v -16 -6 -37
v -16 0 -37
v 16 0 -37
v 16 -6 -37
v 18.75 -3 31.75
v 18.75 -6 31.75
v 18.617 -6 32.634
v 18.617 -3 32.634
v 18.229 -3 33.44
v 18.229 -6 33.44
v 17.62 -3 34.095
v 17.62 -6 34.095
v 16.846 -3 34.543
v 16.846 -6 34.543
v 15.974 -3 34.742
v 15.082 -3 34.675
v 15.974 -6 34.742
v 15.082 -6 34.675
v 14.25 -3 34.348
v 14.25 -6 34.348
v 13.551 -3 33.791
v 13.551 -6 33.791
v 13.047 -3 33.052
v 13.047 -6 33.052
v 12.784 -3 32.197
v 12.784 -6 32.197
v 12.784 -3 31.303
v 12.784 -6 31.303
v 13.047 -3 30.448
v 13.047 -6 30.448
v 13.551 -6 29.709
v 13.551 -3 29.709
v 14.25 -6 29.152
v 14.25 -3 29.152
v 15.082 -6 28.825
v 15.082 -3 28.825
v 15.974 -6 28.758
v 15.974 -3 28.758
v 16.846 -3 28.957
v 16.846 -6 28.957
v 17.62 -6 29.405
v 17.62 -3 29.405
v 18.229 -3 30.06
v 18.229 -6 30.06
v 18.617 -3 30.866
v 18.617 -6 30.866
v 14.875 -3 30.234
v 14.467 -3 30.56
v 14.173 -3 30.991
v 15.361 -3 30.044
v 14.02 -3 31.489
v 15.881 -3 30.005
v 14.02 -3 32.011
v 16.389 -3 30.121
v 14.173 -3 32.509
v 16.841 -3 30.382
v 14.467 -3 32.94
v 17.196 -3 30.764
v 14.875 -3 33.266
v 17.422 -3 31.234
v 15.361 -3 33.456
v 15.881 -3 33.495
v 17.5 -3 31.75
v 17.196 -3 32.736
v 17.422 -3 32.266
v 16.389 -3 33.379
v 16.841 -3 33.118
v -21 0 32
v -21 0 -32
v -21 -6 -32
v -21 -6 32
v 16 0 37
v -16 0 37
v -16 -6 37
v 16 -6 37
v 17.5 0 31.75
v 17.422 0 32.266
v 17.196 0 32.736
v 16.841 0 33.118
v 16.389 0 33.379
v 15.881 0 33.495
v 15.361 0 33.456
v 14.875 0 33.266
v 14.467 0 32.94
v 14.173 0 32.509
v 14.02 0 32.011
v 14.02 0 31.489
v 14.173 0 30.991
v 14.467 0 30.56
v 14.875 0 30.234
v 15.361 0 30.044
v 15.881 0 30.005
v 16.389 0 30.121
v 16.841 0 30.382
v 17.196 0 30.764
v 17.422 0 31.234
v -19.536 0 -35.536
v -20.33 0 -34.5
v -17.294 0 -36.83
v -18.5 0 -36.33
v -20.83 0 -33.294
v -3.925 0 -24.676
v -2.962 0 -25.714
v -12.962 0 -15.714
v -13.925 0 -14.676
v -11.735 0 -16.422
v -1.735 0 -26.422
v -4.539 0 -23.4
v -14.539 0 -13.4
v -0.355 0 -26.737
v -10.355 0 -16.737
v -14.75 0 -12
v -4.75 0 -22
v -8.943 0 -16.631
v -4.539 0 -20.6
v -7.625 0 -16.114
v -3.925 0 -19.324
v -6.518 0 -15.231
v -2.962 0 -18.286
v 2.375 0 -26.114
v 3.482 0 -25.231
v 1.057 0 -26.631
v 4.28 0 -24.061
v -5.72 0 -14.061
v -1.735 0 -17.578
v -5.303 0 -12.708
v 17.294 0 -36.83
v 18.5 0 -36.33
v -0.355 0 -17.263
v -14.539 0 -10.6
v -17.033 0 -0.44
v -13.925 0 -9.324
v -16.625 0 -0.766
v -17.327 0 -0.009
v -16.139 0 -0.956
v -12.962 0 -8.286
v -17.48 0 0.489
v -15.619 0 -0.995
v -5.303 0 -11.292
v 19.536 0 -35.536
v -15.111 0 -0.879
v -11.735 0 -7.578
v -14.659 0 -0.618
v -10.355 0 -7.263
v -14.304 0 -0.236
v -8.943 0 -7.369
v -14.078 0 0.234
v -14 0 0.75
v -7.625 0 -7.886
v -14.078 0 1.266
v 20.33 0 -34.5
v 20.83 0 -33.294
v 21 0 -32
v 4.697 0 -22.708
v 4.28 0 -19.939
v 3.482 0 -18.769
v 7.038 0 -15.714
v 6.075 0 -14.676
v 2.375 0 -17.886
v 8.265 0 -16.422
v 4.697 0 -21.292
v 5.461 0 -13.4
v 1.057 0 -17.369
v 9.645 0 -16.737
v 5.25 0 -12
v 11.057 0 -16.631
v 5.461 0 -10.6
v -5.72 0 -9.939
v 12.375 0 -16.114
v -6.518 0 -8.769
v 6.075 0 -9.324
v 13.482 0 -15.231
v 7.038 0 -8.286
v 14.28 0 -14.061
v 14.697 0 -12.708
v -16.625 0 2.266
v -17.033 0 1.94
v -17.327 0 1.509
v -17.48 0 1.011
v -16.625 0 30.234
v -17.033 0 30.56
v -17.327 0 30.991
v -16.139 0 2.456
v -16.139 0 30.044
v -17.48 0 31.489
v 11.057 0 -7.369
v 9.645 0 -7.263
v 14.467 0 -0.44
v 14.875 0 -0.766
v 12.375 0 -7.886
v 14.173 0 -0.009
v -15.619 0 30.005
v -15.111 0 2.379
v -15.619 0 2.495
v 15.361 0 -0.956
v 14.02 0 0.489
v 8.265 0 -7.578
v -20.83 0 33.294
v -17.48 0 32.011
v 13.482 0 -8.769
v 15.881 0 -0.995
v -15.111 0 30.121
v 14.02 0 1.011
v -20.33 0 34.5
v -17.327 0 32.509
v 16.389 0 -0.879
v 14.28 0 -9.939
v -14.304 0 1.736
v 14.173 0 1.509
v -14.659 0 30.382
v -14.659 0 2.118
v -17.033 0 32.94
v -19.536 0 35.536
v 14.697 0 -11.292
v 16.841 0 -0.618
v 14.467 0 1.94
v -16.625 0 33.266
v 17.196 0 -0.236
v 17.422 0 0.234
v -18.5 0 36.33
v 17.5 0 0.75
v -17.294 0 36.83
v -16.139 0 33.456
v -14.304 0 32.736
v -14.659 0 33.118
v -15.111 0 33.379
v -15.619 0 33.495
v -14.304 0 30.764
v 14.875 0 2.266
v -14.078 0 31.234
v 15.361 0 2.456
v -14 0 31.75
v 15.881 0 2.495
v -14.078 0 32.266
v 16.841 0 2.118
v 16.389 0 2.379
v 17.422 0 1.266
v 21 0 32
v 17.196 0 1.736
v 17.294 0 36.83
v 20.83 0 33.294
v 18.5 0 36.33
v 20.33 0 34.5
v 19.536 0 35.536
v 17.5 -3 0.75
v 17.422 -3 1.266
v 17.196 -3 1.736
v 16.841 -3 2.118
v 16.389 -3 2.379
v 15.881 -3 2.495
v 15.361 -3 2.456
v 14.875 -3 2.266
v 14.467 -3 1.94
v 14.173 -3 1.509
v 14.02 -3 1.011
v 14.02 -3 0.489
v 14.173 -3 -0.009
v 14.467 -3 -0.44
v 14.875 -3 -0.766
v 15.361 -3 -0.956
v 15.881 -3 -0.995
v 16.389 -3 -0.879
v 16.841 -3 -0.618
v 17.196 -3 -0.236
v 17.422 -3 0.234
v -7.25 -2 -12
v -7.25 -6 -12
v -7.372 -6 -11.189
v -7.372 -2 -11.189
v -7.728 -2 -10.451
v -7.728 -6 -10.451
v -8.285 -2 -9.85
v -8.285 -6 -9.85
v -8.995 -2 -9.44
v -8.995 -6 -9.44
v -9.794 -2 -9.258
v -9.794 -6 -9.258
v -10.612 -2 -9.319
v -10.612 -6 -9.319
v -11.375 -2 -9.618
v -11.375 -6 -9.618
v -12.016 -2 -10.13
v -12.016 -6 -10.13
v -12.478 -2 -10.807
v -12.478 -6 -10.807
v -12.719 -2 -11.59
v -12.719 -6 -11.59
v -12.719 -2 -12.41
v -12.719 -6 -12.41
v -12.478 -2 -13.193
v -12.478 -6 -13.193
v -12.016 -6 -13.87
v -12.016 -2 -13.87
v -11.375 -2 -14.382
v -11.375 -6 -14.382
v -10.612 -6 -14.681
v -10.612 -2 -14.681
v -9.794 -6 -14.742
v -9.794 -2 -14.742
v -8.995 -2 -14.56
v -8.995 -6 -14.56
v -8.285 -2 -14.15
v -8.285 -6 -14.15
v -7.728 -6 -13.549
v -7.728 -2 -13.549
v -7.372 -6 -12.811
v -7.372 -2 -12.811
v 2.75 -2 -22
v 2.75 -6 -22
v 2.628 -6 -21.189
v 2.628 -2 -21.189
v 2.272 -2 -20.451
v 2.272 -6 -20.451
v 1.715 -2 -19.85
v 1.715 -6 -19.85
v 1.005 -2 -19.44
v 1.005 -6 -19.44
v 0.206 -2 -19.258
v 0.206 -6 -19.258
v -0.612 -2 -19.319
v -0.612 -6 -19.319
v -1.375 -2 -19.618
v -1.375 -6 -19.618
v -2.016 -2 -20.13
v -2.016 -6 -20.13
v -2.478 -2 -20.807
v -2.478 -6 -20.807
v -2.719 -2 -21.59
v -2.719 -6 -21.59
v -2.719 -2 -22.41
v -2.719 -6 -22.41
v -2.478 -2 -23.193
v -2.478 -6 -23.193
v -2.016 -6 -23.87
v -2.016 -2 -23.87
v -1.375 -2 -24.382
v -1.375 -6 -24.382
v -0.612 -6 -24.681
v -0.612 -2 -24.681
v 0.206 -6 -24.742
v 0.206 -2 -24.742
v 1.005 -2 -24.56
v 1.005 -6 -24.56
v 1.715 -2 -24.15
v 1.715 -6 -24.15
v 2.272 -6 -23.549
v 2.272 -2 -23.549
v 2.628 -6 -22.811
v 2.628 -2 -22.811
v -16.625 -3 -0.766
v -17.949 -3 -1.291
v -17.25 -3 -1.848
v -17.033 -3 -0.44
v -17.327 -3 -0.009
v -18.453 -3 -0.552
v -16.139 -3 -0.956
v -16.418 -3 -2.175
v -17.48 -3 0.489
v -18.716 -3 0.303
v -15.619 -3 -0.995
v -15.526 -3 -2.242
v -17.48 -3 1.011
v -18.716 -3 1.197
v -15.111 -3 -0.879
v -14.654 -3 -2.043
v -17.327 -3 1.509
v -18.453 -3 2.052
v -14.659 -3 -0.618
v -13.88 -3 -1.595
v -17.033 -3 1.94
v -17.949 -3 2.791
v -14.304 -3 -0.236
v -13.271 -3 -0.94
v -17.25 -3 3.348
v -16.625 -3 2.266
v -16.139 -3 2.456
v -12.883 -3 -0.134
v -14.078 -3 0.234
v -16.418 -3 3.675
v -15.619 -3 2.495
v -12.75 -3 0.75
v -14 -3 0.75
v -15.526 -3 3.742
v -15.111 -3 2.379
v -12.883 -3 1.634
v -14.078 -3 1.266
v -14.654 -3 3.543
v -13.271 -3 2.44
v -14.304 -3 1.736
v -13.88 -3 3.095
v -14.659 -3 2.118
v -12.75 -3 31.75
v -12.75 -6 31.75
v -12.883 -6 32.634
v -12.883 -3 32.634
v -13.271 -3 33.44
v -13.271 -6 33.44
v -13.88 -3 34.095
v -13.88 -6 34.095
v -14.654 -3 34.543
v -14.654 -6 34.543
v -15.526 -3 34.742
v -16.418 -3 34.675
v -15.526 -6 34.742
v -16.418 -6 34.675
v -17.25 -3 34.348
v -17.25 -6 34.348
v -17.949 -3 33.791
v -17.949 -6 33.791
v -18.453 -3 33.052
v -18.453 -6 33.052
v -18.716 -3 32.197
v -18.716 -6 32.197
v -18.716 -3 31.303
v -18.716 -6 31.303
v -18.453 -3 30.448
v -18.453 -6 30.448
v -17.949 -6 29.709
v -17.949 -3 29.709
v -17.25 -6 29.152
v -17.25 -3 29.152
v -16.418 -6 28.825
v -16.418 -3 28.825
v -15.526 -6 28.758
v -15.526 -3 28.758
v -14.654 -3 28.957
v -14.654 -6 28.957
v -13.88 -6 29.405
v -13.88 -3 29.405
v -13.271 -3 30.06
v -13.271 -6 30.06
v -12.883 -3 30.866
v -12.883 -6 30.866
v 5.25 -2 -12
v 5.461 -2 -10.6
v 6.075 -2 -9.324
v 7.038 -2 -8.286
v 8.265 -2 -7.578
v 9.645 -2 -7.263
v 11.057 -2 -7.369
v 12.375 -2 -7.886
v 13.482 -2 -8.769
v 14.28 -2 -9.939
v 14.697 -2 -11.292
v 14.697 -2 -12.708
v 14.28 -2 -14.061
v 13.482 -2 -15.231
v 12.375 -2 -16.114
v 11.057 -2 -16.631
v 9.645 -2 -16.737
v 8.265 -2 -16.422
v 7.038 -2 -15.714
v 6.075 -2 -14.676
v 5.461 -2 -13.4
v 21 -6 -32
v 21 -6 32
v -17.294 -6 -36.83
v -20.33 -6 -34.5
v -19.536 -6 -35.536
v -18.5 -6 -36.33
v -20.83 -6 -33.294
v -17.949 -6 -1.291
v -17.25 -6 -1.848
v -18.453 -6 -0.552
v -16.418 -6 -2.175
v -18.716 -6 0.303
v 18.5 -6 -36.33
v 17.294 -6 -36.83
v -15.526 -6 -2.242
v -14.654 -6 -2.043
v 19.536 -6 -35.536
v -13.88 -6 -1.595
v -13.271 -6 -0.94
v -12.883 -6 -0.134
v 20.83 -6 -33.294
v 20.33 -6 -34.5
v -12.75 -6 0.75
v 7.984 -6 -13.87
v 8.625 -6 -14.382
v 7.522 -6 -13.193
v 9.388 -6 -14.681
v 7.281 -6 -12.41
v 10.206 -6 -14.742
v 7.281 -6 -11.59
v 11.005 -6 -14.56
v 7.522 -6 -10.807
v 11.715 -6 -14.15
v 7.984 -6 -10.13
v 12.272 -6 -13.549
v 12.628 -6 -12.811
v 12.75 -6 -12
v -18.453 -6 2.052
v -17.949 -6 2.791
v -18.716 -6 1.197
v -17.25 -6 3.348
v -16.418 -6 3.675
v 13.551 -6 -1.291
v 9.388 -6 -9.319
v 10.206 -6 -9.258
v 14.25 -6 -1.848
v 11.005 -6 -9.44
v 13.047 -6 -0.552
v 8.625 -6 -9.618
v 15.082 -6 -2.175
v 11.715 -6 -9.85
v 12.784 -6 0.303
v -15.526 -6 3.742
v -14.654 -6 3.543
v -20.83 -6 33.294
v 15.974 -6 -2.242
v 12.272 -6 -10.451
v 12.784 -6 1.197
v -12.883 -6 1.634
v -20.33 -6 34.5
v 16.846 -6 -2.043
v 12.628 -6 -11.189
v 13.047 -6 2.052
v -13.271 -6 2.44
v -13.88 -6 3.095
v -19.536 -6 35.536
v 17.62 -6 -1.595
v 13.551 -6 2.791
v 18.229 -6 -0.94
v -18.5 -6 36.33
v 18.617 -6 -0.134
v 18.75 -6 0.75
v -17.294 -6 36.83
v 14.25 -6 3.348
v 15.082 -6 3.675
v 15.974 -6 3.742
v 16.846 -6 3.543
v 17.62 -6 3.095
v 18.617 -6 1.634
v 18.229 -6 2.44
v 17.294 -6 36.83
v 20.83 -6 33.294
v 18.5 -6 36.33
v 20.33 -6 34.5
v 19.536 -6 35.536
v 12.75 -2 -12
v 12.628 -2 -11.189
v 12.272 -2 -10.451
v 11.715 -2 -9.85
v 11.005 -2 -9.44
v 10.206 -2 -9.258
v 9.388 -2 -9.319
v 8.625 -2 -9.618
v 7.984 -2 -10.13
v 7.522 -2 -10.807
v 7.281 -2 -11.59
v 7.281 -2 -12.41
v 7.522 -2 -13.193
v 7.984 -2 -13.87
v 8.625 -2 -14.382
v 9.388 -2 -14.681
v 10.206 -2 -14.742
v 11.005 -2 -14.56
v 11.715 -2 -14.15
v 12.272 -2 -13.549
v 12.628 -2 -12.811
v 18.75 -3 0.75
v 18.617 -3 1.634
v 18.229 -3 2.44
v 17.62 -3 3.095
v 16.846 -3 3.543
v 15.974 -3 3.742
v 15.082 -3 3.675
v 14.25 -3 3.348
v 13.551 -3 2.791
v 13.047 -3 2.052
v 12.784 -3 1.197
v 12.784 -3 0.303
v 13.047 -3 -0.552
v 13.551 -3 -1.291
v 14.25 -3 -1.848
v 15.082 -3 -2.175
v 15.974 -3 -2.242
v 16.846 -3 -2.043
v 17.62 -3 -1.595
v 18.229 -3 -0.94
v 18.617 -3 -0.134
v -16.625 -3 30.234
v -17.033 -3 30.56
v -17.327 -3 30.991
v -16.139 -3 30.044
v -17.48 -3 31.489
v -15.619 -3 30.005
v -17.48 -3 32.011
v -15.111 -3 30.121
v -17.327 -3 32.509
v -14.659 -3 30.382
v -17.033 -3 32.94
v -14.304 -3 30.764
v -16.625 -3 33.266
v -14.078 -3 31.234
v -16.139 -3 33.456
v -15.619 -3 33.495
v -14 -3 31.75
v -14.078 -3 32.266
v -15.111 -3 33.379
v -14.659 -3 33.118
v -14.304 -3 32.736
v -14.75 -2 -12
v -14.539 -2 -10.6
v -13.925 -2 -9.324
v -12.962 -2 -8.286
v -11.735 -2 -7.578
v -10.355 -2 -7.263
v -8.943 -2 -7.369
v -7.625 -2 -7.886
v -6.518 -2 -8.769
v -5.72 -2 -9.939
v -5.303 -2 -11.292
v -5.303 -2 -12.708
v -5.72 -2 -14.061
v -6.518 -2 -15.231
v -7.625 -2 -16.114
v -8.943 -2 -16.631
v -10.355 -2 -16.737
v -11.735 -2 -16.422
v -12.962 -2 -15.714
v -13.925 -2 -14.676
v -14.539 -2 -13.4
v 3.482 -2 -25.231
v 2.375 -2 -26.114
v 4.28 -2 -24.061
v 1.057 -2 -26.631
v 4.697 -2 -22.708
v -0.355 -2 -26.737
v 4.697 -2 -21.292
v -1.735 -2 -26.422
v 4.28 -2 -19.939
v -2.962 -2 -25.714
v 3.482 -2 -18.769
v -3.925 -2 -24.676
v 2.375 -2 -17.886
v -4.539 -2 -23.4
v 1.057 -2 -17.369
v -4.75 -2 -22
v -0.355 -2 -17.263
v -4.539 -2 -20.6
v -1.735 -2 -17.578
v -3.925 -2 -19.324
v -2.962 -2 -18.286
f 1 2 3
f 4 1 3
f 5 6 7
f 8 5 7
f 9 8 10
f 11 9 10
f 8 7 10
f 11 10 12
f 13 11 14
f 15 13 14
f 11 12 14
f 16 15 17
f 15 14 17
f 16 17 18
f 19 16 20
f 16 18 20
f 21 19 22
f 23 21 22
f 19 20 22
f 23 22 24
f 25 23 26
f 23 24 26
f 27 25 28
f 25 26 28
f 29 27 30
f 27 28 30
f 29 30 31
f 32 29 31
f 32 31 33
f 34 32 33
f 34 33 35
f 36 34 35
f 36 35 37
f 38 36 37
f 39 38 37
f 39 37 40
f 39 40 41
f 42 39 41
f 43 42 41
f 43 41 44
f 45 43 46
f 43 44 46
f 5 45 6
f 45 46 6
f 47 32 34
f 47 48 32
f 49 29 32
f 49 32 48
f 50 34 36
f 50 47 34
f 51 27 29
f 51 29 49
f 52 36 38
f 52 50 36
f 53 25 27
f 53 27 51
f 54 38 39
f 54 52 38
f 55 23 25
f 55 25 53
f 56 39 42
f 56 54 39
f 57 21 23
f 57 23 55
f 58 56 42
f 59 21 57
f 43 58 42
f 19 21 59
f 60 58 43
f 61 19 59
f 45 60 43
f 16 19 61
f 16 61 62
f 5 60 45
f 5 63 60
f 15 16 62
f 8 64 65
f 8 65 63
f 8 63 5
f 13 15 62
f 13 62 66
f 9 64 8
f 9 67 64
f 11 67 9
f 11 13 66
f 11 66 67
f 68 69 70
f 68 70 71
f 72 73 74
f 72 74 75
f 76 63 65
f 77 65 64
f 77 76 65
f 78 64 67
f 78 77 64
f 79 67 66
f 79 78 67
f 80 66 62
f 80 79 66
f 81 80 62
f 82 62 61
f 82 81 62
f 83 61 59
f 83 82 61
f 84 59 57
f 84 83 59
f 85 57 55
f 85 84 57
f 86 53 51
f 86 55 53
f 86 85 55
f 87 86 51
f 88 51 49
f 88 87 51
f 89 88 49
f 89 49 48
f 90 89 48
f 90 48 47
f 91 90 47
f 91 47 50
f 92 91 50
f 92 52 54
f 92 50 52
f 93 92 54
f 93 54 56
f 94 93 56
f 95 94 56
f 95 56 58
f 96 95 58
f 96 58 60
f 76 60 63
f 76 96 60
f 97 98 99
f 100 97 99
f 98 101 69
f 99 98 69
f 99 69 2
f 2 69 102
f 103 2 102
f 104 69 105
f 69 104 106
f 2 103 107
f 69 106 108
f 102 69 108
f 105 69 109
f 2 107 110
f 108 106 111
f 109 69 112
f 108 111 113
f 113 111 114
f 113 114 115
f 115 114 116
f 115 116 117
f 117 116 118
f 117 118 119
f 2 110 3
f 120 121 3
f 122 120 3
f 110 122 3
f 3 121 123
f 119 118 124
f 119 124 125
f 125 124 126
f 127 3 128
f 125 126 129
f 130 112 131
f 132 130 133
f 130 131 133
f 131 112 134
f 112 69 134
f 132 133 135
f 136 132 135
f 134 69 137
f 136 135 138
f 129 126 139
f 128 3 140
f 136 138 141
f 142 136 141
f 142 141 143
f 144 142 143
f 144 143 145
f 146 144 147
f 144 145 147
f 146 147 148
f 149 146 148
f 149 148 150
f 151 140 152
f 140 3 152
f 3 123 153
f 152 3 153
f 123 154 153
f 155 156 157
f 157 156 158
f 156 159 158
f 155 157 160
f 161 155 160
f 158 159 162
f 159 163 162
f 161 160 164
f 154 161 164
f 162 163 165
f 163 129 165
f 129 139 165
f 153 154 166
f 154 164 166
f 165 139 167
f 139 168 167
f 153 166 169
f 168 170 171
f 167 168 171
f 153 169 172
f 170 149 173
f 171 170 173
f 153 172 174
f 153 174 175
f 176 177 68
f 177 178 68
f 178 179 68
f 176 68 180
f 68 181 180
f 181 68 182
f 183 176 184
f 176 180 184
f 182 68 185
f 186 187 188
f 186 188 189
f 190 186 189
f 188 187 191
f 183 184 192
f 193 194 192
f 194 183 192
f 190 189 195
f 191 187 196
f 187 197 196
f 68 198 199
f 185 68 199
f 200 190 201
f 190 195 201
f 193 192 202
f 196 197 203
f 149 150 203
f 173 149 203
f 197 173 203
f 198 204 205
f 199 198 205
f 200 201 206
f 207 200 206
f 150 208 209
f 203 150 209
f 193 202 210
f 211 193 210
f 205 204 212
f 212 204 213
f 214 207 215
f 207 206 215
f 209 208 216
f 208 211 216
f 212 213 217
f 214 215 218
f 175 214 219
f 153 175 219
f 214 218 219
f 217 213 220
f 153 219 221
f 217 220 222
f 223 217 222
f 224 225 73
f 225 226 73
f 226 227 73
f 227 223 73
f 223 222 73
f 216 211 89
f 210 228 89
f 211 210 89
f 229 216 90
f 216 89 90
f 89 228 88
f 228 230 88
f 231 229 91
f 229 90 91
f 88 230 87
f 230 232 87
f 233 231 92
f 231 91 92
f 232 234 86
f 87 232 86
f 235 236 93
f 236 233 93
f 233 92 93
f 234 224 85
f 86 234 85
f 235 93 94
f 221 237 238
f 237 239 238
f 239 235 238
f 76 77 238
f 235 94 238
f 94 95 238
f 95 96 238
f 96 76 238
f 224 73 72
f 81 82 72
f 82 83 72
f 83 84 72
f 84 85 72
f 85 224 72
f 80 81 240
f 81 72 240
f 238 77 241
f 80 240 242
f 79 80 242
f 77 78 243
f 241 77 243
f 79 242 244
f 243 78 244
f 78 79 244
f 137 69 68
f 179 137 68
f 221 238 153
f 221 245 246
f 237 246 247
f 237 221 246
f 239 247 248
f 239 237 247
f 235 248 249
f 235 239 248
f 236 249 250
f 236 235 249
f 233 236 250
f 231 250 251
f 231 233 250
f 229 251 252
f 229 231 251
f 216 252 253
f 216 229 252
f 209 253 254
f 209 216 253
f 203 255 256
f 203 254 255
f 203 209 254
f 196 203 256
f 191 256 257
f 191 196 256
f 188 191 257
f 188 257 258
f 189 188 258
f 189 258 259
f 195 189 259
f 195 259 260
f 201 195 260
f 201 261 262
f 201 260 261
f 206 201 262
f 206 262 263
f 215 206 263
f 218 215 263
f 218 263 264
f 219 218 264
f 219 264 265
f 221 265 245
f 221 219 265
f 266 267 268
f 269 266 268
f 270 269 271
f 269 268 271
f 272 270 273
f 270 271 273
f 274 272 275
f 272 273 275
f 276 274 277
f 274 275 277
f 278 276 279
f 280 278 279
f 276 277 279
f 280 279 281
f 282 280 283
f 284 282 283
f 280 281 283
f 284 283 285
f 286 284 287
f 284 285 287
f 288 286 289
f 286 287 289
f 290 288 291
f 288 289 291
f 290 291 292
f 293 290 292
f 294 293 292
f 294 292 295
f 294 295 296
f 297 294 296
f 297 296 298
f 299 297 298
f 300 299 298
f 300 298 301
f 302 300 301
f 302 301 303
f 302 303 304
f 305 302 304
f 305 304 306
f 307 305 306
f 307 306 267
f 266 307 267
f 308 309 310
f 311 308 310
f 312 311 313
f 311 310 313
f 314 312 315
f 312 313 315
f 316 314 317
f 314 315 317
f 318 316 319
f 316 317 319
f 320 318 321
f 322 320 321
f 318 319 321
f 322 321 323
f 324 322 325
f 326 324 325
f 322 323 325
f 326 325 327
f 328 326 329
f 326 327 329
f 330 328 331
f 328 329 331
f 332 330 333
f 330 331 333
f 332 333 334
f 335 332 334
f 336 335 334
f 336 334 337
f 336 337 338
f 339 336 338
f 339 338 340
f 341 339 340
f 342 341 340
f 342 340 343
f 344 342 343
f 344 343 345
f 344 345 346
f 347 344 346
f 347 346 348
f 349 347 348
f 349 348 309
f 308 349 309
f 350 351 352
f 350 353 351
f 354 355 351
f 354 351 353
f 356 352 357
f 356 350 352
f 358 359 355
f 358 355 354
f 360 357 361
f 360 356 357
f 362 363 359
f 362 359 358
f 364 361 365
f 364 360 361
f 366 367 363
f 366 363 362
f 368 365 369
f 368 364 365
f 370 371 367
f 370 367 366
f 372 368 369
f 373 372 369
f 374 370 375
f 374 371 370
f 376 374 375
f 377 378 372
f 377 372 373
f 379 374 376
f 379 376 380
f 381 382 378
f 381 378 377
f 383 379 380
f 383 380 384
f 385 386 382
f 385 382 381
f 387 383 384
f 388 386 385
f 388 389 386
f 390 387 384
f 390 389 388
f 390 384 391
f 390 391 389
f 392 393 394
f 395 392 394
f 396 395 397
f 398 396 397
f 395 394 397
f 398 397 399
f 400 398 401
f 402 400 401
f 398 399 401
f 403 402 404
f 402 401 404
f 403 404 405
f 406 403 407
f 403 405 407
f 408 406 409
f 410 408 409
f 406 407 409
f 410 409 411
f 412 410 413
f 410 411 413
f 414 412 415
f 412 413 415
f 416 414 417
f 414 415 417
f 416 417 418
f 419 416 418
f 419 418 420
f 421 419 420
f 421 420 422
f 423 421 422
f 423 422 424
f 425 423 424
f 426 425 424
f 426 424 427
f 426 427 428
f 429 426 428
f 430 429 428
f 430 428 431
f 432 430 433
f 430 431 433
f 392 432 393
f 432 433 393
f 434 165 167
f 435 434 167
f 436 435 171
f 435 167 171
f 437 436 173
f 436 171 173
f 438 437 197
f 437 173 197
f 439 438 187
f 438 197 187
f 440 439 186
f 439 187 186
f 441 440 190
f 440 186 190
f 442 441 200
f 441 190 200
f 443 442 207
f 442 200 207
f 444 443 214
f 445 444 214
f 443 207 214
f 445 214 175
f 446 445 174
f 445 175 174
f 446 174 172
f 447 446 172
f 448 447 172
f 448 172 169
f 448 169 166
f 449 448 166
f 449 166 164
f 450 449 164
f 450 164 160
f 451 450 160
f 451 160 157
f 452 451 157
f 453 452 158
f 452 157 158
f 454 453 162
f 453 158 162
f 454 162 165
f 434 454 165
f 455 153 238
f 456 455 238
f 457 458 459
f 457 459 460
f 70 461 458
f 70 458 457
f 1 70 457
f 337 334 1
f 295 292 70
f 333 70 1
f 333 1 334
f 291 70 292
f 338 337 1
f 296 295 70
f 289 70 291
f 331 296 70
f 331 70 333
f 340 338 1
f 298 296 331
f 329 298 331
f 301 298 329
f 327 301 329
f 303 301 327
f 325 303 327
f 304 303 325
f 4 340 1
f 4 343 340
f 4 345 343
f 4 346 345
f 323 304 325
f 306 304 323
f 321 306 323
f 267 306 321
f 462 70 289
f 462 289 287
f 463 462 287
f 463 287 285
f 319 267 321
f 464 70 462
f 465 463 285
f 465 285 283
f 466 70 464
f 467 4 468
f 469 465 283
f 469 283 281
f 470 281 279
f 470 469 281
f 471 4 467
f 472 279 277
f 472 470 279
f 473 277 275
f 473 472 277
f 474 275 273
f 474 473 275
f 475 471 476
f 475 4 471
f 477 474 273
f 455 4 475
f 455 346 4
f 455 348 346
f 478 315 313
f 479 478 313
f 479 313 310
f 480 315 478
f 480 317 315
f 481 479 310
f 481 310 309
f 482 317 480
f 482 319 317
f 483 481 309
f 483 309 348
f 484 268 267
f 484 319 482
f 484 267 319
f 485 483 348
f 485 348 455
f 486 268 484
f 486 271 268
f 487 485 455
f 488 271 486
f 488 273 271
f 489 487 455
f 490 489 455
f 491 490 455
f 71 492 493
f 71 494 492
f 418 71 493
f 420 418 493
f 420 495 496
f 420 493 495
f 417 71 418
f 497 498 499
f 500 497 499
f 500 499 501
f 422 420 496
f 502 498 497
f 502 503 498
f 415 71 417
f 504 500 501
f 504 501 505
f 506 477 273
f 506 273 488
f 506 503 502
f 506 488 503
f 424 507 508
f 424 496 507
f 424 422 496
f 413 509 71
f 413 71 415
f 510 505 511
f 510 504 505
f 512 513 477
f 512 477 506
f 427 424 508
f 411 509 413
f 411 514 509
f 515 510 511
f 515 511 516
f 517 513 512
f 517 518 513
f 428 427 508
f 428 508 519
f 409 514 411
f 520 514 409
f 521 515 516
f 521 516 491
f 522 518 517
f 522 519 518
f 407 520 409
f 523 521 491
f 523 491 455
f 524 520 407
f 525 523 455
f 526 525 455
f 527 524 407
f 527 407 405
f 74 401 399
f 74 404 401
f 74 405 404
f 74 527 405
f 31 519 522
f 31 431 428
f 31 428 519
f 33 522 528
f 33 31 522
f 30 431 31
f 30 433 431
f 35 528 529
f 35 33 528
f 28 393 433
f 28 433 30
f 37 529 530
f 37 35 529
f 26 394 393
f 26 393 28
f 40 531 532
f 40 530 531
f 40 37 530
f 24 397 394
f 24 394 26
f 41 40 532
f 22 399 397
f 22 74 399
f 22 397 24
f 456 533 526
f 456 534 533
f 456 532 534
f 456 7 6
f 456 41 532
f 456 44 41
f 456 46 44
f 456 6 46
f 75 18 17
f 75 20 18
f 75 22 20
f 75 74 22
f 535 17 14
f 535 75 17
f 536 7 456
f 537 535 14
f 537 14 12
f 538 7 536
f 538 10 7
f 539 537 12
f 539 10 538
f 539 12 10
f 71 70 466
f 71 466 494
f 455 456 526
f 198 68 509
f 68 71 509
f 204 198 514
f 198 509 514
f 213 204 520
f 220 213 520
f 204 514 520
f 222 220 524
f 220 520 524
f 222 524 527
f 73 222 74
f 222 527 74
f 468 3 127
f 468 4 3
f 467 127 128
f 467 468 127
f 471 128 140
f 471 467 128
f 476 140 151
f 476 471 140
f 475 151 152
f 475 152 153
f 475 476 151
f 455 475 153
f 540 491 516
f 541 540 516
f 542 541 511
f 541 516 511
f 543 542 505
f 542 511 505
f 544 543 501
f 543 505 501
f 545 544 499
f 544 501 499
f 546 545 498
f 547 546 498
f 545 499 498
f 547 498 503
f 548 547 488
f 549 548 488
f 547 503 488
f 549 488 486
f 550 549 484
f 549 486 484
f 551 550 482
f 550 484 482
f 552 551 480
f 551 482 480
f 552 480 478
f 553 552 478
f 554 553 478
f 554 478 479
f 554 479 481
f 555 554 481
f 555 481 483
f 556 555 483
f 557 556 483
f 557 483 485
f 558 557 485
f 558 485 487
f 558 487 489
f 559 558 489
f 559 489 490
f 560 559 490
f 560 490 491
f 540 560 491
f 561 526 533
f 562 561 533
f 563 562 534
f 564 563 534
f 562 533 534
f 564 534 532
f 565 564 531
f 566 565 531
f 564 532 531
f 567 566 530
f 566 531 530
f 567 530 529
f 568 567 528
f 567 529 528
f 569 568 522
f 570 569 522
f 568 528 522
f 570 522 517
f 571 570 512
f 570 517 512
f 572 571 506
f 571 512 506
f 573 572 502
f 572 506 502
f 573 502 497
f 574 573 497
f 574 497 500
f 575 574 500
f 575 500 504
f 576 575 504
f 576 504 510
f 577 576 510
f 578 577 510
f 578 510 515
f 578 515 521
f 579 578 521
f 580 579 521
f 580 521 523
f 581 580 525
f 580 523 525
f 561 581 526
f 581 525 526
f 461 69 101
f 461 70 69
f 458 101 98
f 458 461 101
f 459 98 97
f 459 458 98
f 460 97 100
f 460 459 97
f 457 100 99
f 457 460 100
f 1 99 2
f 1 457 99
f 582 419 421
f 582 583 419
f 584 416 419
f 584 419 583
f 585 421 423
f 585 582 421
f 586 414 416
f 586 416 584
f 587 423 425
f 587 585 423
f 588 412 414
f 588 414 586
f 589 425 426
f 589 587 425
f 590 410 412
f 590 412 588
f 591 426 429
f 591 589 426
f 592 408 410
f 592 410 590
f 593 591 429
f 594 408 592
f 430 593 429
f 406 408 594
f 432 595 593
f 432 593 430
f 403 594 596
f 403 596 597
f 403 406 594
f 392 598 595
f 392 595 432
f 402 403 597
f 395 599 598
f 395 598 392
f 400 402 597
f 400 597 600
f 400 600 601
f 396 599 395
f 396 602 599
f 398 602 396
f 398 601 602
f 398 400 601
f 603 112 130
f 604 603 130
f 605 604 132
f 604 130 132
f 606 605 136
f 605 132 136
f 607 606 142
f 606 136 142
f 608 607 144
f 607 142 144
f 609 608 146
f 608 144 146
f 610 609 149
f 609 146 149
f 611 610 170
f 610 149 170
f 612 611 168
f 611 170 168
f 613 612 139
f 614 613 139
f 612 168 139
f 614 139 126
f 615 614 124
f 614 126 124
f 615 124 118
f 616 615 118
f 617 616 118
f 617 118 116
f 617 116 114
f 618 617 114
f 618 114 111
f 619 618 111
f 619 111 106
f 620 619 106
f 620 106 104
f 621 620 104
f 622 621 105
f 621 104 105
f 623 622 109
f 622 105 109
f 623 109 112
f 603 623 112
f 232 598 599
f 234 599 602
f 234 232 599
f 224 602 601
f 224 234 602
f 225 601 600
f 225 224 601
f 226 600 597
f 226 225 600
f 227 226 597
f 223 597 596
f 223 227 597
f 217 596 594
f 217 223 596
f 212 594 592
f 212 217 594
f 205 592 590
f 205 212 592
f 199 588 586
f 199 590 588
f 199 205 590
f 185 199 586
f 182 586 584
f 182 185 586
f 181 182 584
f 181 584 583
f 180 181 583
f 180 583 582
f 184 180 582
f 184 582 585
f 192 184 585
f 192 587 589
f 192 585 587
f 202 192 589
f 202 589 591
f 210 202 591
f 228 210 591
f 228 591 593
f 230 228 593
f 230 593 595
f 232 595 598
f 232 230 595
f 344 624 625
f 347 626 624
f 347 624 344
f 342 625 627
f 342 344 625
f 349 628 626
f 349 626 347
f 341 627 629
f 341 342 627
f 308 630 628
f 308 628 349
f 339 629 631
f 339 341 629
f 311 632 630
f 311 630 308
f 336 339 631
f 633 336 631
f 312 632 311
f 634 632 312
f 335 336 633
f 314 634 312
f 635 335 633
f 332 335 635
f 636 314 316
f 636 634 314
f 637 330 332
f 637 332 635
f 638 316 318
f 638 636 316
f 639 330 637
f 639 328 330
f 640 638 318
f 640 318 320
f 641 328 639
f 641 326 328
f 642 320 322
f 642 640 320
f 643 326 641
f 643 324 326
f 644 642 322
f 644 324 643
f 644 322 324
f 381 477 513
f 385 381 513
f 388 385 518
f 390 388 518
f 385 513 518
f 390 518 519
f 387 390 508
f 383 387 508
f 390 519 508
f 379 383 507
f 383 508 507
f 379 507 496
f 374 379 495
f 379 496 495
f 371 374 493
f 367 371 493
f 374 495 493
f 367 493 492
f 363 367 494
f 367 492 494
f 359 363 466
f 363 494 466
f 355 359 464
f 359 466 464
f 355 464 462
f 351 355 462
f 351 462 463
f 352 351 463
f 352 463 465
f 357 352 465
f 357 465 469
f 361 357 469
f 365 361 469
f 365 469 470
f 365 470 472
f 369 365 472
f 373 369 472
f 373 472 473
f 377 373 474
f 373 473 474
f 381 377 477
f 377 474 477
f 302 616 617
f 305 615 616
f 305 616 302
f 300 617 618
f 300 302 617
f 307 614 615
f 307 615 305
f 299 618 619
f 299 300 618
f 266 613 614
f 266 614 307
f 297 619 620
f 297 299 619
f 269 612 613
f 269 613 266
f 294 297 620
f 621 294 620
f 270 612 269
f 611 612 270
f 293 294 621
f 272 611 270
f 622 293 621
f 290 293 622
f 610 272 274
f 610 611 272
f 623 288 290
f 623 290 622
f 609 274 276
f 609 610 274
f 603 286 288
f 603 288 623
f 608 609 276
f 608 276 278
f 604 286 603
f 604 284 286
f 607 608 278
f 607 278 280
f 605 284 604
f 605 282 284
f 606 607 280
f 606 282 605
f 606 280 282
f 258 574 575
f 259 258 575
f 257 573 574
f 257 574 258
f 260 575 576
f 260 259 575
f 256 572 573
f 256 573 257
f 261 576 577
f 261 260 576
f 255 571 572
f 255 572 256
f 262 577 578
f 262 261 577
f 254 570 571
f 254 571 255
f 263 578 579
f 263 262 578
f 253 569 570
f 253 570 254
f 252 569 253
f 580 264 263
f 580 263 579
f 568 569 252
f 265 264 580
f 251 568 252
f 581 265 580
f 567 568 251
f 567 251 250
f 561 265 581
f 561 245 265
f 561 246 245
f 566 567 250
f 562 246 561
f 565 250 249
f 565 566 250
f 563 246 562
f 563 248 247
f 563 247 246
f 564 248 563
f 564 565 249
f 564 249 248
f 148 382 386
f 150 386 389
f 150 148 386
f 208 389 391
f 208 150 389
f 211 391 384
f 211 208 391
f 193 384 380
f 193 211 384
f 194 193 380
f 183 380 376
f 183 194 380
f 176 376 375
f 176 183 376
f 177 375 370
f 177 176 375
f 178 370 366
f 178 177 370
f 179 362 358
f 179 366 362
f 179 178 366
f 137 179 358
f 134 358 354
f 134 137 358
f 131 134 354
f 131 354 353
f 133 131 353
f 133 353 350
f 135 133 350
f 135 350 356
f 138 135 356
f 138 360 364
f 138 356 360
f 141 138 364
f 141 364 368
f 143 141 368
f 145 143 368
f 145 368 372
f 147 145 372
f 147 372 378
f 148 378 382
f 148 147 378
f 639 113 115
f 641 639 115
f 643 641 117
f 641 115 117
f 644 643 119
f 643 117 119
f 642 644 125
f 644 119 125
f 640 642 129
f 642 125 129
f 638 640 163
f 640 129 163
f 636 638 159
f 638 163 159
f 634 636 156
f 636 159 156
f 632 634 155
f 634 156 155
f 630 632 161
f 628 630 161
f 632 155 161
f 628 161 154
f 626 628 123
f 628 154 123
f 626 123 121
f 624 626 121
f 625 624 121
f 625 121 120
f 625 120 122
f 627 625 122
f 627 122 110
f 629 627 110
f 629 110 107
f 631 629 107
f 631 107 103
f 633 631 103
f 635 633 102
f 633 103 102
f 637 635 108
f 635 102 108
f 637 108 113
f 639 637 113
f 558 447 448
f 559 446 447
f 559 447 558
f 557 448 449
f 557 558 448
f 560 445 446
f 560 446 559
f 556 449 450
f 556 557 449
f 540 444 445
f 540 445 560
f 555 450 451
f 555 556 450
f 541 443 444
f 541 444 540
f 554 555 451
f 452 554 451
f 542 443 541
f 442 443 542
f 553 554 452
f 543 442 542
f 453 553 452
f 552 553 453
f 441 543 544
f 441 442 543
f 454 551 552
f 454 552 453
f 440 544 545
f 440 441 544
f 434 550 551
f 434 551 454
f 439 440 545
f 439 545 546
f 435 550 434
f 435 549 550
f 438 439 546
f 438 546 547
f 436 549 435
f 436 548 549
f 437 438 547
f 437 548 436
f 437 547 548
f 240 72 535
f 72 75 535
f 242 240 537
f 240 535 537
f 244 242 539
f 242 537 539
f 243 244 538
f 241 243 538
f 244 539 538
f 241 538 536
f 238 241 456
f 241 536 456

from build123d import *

# Parameters (mm, degrees)
F0_W     = 42
F0_H     = 74
F0_R     = 1.75
F1_DEPTH = 6
F3_R     = 5
F2_R     = 3
F4_DEPTH = 3
F5_R     = 2.75
F6_DEPTH = 6
F7_R     = 4.75
F8_DEPTH = 2


with BuildPart() as f1:
    # F0 (on Front) → F1 (new body)
    with BuildSketch(Plane.XZ):
        Rectangle(F0_W, F0_H)
        with Locations((-15.75, 0.75)):
            Circle(F0_R, mode=Mode.SUBTRACT)
        with Locations((-15.75, 31.75)):
            Circle(F0_R, mode=Mode.SUBTRACT)
        with Locations((15.75, 0.75)):
            Circle(F0_R, mode=Mode.SUBTRACT)
        with Locations((15.75, 31.75)):
            Circle(F0_R, mode=Mode.SUBTRACT)
    extrude(amount=F1_DEPTH)

    # F3
    f3_edges = [f1.edges().sort_by_distance(p)[0] for p in [
        (-21, -3, -37),
        (-21, -3, 37),
        (21, -3, 37),
        (21, -3, -37),
    ]]
    fillet(f3_edges, radius=F3_R)

    # F2 (on face) → F4 (cut)
    with BuildSketch(Plane.XZ.offset(6)):
        with Locations((-15.75, 0.75)):
            Circle(F2_R)
        with Locations((15.75, 0.75)):
            Circle(F2_R)
        with Locations((-15.75, 31.75)):
            Circle(F2_R)
        with Locations((15.75, 31.75)):
            Circle(F2_R)
    extrude(amount=-F4_DEPTH, mode=Mode.SUBTRACT)

    # F5 (on face) → F6 (cut, through all)
    with BuildSketch(Plane.XZ.offset(6)):
        with Locations((0, -22)):
            Circle(F5_R)
        with Locations((-10, -12)):
            Circle(F5_R)
        with Locations((10, -12)):
            Circle(F5_R)
    extrude(amount=-F6_DEPTH, mode=Mode.SUBTRACT)

    # F7 (on face) → F8 (cut)
    with BuildSketch(Plane(origin=(0, 0, 0), x_dir=(-1, 0, 0), z_dir=(0, 1, 0))):
        with Locations((-10, -12)):
            Circle(F7_R)
        with Locations((10, -12)):
            Circle(F7_R)
        with Locations((0, -22)):
            Circle(F7_R)
    extrude(amount=-F8_DEPTH, mode=Mode.SUBTRACT)


solid = f1.part
